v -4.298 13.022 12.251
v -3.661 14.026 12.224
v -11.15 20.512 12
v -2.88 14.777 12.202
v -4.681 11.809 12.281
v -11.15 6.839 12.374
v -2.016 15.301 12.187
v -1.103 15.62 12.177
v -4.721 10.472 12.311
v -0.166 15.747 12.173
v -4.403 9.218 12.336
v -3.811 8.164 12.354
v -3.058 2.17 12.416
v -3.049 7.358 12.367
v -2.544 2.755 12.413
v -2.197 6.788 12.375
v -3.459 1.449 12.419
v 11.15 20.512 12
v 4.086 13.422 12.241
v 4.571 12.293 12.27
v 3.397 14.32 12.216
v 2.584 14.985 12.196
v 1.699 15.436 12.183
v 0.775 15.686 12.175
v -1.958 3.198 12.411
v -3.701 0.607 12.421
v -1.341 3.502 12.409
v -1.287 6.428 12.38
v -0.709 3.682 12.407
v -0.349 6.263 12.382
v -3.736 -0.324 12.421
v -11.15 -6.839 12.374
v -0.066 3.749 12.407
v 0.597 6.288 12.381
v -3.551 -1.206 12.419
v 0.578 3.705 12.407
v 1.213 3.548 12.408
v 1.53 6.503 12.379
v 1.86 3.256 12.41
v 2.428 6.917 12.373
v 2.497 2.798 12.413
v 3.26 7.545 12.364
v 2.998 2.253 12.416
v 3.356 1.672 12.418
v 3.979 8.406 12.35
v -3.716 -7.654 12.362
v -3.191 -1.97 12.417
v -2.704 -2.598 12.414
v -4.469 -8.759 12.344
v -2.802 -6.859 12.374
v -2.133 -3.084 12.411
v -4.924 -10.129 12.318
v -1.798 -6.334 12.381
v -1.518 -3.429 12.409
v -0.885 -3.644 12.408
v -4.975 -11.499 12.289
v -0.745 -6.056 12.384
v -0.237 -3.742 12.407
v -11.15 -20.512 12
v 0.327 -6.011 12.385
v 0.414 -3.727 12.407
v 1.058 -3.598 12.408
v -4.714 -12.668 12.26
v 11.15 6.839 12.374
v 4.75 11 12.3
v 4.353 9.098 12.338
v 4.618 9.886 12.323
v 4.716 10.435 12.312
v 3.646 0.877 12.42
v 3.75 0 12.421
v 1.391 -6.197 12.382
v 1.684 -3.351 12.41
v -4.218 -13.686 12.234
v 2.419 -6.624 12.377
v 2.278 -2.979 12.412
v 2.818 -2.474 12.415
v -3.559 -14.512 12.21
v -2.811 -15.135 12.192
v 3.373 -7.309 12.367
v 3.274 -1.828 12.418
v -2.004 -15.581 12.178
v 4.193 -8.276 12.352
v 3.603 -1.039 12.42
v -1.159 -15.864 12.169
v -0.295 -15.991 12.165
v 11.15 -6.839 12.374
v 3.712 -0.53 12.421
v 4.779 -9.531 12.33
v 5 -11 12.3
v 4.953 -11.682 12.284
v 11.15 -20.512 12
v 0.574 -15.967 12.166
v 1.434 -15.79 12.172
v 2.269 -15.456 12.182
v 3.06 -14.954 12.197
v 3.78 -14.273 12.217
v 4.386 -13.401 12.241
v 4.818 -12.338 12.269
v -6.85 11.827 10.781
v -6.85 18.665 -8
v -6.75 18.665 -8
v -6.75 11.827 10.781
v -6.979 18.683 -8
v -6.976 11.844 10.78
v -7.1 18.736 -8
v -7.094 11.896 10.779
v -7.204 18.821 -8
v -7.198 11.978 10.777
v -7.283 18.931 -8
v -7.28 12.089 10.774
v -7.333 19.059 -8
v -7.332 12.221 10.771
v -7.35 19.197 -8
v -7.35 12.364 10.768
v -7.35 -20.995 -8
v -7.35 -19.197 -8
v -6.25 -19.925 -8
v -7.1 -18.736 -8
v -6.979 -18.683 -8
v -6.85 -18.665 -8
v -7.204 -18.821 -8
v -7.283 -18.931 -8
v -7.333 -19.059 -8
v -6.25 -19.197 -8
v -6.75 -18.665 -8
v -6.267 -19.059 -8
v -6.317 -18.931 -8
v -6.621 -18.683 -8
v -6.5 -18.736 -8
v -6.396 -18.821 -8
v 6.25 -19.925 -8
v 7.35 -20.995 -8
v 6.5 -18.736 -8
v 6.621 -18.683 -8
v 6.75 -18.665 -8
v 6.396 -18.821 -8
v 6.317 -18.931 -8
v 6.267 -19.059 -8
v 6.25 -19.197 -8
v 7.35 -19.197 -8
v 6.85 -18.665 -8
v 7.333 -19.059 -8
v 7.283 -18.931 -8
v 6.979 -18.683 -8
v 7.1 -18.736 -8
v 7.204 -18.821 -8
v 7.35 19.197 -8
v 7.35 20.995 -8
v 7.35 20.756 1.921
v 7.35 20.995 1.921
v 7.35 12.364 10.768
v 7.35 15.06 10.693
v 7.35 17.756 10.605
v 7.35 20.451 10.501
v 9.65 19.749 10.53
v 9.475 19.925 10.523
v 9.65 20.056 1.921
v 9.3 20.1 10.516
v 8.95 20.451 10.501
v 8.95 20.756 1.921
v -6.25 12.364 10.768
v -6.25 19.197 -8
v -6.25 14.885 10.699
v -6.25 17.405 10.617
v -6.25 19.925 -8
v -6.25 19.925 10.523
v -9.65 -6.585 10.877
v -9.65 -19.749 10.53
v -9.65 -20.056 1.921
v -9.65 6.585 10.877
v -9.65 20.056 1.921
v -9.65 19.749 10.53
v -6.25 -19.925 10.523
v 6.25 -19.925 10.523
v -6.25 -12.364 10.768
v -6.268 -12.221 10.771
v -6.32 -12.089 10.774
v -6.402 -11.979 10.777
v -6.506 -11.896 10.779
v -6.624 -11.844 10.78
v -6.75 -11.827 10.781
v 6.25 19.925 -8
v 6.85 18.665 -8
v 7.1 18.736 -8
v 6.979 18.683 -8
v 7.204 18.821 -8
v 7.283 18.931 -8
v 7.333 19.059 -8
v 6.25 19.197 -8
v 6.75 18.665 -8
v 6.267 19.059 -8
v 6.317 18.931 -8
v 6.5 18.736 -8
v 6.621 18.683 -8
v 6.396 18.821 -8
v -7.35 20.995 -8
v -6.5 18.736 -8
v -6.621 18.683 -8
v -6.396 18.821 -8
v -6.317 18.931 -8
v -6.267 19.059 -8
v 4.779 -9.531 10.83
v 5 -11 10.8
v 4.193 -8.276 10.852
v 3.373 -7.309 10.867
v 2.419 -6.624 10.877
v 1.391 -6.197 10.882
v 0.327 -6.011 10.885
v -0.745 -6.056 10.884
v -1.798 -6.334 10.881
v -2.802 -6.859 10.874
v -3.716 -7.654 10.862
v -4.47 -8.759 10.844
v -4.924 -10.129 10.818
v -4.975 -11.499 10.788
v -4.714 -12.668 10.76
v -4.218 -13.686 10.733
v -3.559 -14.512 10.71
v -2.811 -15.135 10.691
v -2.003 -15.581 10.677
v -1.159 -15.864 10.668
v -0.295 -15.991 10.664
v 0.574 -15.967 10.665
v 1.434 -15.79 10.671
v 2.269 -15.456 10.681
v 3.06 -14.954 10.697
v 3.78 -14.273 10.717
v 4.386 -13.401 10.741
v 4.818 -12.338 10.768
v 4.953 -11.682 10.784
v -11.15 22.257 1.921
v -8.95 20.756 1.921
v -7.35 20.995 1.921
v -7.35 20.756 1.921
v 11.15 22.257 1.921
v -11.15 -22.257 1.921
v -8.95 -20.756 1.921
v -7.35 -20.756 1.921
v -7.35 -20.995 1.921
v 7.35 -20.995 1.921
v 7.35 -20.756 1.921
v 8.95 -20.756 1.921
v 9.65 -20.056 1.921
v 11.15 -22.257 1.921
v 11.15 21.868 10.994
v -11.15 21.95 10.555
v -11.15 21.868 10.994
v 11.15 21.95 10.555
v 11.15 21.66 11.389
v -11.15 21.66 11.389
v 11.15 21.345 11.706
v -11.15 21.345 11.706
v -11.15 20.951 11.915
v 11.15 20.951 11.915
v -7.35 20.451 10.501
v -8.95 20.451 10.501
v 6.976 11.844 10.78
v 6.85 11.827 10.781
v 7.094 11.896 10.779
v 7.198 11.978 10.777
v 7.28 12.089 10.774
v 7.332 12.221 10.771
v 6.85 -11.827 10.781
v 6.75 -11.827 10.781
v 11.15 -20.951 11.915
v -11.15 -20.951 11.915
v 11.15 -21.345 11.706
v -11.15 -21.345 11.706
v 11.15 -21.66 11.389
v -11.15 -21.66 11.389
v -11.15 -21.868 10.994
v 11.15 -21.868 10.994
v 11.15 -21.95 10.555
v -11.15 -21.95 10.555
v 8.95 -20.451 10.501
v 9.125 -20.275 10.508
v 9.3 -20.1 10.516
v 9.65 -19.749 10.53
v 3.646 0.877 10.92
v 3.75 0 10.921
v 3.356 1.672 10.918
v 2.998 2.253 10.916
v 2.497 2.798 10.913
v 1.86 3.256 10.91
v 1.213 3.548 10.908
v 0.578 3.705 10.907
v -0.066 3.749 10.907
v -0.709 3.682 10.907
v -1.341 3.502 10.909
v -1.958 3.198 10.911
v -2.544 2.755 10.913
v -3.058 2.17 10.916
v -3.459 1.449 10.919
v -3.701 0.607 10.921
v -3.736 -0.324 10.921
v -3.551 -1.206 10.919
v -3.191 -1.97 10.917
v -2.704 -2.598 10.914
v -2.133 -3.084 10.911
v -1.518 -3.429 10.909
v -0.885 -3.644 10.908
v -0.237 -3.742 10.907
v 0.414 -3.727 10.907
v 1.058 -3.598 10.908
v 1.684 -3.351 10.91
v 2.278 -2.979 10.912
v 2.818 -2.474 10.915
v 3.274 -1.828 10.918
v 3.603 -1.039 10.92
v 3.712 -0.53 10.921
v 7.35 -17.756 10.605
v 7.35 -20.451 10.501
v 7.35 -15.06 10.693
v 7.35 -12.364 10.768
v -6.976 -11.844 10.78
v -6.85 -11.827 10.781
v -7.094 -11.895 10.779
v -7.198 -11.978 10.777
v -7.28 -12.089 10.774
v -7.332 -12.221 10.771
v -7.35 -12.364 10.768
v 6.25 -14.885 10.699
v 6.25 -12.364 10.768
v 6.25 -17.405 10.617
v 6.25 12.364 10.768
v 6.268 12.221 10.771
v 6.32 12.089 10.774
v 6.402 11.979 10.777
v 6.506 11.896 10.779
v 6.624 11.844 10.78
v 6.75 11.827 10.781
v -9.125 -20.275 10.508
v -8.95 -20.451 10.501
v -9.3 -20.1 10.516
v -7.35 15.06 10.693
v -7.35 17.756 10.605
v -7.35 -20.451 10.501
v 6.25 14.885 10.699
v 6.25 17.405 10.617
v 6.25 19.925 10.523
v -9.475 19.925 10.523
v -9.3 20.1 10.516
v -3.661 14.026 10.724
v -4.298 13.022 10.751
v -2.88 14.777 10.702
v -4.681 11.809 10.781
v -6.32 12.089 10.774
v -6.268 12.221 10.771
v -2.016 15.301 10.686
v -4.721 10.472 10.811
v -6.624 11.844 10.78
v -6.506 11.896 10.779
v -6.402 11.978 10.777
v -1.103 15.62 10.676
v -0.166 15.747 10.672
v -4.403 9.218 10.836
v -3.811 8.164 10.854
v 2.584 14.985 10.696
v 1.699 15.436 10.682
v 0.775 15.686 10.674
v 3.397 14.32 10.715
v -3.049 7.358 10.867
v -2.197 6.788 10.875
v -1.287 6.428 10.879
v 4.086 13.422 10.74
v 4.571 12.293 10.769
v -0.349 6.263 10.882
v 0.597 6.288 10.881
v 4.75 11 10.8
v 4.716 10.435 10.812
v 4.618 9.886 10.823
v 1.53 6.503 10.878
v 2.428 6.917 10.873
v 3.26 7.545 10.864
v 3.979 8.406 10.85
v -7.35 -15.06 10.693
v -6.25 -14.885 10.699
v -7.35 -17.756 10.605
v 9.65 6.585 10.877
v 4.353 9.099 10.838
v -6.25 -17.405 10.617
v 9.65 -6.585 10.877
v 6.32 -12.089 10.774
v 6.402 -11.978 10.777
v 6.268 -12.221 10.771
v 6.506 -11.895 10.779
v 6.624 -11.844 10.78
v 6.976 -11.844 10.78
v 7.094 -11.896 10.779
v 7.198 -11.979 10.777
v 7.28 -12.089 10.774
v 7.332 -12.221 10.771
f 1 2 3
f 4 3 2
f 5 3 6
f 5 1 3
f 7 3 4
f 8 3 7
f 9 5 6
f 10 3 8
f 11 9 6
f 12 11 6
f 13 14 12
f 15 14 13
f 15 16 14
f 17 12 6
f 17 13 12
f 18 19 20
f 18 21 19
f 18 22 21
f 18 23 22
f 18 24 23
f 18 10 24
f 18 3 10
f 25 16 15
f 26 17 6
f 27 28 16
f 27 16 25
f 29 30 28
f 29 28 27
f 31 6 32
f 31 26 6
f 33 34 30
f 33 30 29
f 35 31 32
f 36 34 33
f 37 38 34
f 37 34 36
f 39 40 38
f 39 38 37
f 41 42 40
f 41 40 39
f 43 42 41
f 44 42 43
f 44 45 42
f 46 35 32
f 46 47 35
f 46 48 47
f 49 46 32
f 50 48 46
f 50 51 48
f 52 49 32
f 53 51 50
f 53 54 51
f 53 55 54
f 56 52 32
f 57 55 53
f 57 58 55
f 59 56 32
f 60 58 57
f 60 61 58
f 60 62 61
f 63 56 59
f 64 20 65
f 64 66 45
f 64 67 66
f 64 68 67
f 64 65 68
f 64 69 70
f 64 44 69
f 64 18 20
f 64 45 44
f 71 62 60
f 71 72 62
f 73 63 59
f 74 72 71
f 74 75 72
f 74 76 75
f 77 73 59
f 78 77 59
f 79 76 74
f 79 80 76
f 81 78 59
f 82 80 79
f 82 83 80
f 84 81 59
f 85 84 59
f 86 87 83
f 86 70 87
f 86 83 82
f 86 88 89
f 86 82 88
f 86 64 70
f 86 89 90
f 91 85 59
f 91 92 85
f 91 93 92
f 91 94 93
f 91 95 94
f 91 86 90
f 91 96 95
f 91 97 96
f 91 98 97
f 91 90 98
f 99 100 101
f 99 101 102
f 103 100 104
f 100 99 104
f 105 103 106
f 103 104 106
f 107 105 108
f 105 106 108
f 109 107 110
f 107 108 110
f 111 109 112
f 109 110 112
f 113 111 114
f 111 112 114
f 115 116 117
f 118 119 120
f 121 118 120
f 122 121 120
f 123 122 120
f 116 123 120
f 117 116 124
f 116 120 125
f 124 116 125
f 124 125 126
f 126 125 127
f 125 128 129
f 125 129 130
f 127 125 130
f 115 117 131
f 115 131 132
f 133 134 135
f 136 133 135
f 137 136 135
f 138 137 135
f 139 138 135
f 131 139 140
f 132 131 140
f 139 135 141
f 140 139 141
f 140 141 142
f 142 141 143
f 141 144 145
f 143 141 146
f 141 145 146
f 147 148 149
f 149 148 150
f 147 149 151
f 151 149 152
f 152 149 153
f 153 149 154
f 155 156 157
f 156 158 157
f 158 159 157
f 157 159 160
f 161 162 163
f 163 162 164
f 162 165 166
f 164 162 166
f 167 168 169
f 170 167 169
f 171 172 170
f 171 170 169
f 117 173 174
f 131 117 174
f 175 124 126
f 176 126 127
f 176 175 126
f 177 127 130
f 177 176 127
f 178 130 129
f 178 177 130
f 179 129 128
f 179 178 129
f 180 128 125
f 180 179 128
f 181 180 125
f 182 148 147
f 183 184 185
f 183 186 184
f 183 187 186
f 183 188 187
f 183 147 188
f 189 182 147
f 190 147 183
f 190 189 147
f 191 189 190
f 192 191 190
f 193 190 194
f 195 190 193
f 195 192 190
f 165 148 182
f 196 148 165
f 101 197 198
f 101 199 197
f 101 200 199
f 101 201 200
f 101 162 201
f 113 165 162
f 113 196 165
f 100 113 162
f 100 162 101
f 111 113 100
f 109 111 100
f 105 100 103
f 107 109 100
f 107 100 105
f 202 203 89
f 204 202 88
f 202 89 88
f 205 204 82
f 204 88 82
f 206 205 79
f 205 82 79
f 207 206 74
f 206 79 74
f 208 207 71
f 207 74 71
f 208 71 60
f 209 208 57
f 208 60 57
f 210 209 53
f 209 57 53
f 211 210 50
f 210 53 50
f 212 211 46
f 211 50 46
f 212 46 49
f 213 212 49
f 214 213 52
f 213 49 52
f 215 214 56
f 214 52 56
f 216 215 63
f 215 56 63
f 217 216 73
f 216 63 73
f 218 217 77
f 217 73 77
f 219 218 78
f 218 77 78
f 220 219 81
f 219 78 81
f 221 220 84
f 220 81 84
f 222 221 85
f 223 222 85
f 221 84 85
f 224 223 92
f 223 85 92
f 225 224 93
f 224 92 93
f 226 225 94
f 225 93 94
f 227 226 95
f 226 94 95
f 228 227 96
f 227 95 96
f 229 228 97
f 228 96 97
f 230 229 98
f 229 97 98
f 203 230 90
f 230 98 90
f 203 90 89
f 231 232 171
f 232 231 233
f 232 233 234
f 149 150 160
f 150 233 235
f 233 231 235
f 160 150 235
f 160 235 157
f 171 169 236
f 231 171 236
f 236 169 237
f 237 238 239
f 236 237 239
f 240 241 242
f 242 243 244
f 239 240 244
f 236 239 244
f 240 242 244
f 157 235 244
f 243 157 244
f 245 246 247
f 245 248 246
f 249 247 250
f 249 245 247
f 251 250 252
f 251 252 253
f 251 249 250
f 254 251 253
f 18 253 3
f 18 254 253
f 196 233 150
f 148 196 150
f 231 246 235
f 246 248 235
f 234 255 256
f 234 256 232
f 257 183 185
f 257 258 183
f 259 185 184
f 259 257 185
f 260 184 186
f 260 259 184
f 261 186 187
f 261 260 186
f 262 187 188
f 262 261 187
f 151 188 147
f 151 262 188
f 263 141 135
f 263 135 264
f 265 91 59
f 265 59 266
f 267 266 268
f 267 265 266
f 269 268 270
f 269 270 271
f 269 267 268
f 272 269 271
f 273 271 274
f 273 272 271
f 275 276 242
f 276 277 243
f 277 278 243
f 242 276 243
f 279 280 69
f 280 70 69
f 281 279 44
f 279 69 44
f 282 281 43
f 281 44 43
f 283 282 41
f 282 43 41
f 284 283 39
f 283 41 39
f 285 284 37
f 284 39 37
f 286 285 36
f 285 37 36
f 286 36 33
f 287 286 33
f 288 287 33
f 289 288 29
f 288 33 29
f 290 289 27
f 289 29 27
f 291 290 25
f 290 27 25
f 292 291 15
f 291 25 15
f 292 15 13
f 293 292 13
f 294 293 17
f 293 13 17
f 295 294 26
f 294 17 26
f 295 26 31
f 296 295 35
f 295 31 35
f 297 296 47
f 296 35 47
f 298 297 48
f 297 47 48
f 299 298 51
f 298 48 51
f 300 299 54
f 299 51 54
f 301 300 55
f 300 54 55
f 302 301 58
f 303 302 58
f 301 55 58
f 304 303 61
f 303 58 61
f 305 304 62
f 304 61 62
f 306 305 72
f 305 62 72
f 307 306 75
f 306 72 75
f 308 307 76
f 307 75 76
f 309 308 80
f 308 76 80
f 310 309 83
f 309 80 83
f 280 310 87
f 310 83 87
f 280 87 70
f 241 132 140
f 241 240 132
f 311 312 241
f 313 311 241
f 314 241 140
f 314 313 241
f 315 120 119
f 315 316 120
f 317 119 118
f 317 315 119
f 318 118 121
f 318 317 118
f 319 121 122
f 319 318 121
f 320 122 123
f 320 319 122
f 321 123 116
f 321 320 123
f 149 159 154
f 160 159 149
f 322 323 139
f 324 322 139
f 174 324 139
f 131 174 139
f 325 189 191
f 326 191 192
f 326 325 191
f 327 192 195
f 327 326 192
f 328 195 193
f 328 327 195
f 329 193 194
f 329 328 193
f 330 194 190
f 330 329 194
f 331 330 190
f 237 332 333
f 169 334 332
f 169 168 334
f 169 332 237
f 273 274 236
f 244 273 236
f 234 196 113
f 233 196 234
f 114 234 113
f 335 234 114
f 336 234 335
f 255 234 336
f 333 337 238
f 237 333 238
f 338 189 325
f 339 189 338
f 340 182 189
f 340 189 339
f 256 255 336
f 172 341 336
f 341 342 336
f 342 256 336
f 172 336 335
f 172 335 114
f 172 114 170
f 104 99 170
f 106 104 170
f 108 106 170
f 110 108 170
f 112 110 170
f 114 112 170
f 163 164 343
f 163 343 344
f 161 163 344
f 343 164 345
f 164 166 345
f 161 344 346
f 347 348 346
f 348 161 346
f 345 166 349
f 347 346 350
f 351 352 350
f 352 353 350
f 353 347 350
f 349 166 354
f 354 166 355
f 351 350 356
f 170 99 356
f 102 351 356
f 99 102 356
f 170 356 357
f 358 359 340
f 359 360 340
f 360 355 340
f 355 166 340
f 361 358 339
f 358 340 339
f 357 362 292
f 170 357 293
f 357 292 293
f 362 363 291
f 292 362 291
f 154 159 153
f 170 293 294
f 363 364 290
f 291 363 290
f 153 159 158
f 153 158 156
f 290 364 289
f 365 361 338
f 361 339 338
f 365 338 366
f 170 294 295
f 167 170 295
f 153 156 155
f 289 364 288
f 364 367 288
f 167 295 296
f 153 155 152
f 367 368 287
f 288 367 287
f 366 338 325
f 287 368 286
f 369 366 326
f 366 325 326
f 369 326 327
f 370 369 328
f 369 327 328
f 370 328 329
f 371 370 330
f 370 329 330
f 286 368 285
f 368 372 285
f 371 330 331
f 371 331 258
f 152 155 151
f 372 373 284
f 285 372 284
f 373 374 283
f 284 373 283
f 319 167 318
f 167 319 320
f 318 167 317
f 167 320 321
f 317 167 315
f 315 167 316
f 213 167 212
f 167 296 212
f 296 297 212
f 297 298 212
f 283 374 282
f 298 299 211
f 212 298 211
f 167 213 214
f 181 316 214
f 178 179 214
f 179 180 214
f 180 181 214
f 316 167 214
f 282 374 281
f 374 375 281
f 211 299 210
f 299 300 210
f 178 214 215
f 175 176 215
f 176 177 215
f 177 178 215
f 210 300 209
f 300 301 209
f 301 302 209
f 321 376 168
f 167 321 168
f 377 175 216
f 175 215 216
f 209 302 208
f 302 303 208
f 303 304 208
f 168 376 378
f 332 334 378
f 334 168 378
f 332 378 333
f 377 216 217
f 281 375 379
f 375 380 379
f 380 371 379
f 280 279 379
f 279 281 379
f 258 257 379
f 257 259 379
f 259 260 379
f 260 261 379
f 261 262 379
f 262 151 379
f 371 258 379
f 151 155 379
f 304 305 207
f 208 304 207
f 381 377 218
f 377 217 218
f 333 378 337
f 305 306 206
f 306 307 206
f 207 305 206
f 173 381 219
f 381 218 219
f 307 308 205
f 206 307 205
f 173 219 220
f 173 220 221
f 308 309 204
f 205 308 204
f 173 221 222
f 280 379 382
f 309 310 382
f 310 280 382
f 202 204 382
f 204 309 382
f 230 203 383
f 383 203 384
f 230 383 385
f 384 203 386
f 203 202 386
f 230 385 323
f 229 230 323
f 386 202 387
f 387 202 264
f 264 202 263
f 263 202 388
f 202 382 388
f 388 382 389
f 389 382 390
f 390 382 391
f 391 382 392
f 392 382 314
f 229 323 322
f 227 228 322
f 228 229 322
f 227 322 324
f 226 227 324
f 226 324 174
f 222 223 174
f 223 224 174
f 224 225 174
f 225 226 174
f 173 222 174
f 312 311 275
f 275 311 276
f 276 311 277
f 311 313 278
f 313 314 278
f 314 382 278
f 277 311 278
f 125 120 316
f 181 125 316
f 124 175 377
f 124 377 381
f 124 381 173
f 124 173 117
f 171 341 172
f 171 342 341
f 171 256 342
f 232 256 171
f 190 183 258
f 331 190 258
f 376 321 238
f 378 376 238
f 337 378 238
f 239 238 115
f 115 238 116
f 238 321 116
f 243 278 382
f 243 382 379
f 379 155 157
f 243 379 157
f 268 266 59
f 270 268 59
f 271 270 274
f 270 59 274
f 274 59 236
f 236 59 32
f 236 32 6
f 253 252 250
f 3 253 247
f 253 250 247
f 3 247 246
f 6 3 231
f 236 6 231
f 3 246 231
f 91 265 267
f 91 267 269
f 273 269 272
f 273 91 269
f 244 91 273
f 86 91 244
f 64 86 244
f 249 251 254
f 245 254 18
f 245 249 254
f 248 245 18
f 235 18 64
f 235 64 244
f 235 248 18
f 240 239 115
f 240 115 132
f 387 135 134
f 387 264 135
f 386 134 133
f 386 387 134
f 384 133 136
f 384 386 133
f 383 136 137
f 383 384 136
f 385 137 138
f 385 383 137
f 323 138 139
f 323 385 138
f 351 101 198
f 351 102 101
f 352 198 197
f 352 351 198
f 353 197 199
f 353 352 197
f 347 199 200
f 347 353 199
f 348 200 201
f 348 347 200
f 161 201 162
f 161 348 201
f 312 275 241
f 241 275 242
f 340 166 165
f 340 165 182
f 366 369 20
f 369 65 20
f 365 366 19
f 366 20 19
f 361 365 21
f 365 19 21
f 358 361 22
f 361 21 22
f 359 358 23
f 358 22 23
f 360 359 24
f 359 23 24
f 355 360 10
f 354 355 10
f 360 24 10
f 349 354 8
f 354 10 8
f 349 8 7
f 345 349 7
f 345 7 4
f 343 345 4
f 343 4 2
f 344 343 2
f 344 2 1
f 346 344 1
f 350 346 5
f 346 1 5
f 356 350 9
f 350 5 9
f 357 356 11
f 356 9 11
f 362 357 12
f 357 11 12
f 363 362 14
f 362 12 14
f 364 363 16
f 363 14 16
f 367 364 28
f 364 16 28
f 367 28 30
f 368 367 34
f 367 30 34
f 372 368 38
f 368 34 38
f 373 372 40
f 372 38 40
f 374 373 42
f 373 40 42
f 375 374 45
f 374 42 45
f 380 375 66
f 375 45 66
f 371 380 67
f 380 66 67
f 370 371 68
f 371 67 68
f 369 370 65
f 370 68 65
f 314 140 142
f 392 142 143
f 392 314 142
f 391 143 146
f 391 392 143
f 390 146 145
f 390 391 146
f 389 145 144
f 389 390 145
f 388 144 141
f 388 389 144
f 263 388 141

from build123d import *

# Parameters (mm, degrees)
PAD_DEPTH               = 9.65
PAD001_DEPTH            = 1.5
PAD002_DEPTH            = 1.5
SKETCH003_W             = 14.7
SKETCH003_H             = 1.07
PAD003_DEPTH            = 19
PAD004_DEPTH            = 1.1
PAD005_DEPTH            = 1.1
FILLET001_R             = 0.5
CHAMFER_SIZE            = 0.7
SKETCH011_R             = 3.75
SKETCH011_R_2           = 4.75
SKETCH011_R_3           = 5
POCKET001_DEPTH         = 5
POCKET001_DEPTH_BACK    = 5
BODY001_PLACEMENT_ANGLE = 90


with BuildPart() as part:
    # Sketch → Pad (new body, symmetric)
    with BuildSketch(Plane.YZ):
        with BuildLine():
            ThreePointArc((0, 20.5122), (-0.4209, 0), (0, -20.5122))
            ThreePointArc((0, -20.5122), (0.44097, -21.514212), (1.445369, -21.949718))
            Line((1.445369, -21.949718), (10.0791, -22.257094))
            Line((10.0791, -22.257094), (10.0791, -20.756143))
            Line((1.498737, -20.450667), (10.0791, -20.756143))
            ThreePointArc((1.498737, 20.450667), (1.0791, 0), (1.498737, -20.450667))
            Line((1.498737, 20.450667), (10.0791, 20.756143))
            Line((10.0791, 20.756143), (10.0791, 22.257094))
            Line((1.445369, 21.949718), (10.0791, 22.257094))
            ThreePointArc((1.445369, 21.949718), (0.44097, 21.514212), (0, 20.5122))
        make_face()
    extrude(amount=PAD_DEPTH, both=True)

    # Sketch001 → Pad001 (join)
    with BuildSketch(Plane.YZ.offset(9.65)):
        with BuildLine():
            ThreePointArc((0, 20.5122), (-0.4209, 0), (0, -20.5122))
            ThreePointArc((0, -20.5122), (0.44097, -21.514212), (1.445369, -21.949718))
            Line((1.445369, -21.949718), (10.0791, -22.257094))
            Line((10.0791, 22.257094), (10.0791, -22.257094))
            Line((1.445369, 21.949718), (10.0791, 22.257094))
            ThreePointArc((1.445369, 21.949718), (0.44097, 21.514212), (0, 20.5122))
        make_face()
    extrude(amount=PAD001_DEPTH)

    # Sketch002 → Pad002 (join)
    with BuildSketch(Plane.YZ.offset(-9.65)):
        with BuildLine():
            ThreePointArc((0, 20.5122), (-0.4209, 0), (0, -20.5122))
            ThreePointArc((0, -20.5122), (0.44097, -21.514212), (1.445369, -21.949718))
            Line((1.445369, -21.949718), (10.0791, -22.257094))
            Line((10.0791, 22.257094), (10.0791, -22.257094))
            Line((1.445369, 21.949718), (10.0791, 22.257094))
            ThreePointArc((1.445369, 21.949718), (0.44097, 21.514212), (0, 20.5122))
        make_face()
    extrude(amount=-PAD002_DEPTH)

    # Sketch003 → Pad003 (join)
    with BuildSketch(Plane.XZ.offset(-1)):
        with Locations((0, 20.46)):
            Rectangle(SKETCH003_W, SKETCH003_H)
        with Locations((0, -20.46)):
            Rectangle(SKETCH003_W, SKETCH003_H)
    extrude(amount=-PAD003_DEPTH)

    # Sketch004 → Pad004 (join)
    with BuildSketch(Plane.YZ.offset(7.35)):
        Polygon((1.2, 11.82), (1.2, 19.925), (20, 19.925), (20, 18.665), align=None)
        Polygon((1.2, -11.82), (1.2, -19.925), (20, -19.925), (20, -18.665), align=None)
    extrude(amount=-PAD004_DEPTH)

    # Sketch010 → Pad005 (join)
    with BuildSketch(Plane.YZ.offset(-7.35)):
        Polygon((1.2, 11.82), (1.2, 19.925), (20, 19.925), (20, 18.665), align=None)
        Polygon((1.2, -11.82), (1.2, -19.925), (20, -19.925), (20, -18.665), align=None)
    extrude(amount=PAD005_DEPTH)

    # Fillet001
    fillet001_edges = [part.edges().sort_by_distance(p)[0] for p in [
        (7.35, 10.609705, 15.246034),
        (6.25, 10.609705, 15.246034),
        (-6.25, 10.609705, 15.246034),
        (-7.35, 10.609705, 15.246034),
        (7.35, 10.609705, -15.246034),
        (6.25, 10.609705, -15.246034),
        (-6.25, 10.609705, -15.246034),
        (-7.35, 10.609705, -15.246034),
    ]]
    fillet(fillet001_edges, radius=FILLET001_R)

    # Chamfer
    chamfer_edges = [part.edges().sort_by_distance(p)[0] for p in [
        (9.65, 5.788919, 20.603405),
        (-9.65, 5.788919, 20.603405),
        (-9.65, 5.788919, -20.603405),
        (9.65, 5.788919, -20.603405),
    ]]
    chamfer(chamfer_edges, length=CHAMFER_SIZE)

    # Sketch011 → Pocket001 (cut, two sides)
    with BuildSketch(Plane.XZ) as pocket001_sk:
        Circle(SKETCH011_R)
        with Locations((0, 11)):
            Circle(SKETCH011_R_2)
        with Locations((0, -11)):
            Circle(SKETCH011_R_3)
    extrude(amount=-POCKET001_DEPTH, mode=Mode.SUBTRACT)
    extrude(pocket001_sk.sketch, amount=POCKET001_DEPTH_BACK, mode=Mode.SUBTRACT)


with BuildPart() as part_1:
    # Body001 placement: moved
    add(part.part.moved(Location((0, 0, 12))).rotate(Axis((0, 0, 12), (-1, 0, 0)), BODY001_PLACEMENT_ANGLE))


solid = part_1.part
